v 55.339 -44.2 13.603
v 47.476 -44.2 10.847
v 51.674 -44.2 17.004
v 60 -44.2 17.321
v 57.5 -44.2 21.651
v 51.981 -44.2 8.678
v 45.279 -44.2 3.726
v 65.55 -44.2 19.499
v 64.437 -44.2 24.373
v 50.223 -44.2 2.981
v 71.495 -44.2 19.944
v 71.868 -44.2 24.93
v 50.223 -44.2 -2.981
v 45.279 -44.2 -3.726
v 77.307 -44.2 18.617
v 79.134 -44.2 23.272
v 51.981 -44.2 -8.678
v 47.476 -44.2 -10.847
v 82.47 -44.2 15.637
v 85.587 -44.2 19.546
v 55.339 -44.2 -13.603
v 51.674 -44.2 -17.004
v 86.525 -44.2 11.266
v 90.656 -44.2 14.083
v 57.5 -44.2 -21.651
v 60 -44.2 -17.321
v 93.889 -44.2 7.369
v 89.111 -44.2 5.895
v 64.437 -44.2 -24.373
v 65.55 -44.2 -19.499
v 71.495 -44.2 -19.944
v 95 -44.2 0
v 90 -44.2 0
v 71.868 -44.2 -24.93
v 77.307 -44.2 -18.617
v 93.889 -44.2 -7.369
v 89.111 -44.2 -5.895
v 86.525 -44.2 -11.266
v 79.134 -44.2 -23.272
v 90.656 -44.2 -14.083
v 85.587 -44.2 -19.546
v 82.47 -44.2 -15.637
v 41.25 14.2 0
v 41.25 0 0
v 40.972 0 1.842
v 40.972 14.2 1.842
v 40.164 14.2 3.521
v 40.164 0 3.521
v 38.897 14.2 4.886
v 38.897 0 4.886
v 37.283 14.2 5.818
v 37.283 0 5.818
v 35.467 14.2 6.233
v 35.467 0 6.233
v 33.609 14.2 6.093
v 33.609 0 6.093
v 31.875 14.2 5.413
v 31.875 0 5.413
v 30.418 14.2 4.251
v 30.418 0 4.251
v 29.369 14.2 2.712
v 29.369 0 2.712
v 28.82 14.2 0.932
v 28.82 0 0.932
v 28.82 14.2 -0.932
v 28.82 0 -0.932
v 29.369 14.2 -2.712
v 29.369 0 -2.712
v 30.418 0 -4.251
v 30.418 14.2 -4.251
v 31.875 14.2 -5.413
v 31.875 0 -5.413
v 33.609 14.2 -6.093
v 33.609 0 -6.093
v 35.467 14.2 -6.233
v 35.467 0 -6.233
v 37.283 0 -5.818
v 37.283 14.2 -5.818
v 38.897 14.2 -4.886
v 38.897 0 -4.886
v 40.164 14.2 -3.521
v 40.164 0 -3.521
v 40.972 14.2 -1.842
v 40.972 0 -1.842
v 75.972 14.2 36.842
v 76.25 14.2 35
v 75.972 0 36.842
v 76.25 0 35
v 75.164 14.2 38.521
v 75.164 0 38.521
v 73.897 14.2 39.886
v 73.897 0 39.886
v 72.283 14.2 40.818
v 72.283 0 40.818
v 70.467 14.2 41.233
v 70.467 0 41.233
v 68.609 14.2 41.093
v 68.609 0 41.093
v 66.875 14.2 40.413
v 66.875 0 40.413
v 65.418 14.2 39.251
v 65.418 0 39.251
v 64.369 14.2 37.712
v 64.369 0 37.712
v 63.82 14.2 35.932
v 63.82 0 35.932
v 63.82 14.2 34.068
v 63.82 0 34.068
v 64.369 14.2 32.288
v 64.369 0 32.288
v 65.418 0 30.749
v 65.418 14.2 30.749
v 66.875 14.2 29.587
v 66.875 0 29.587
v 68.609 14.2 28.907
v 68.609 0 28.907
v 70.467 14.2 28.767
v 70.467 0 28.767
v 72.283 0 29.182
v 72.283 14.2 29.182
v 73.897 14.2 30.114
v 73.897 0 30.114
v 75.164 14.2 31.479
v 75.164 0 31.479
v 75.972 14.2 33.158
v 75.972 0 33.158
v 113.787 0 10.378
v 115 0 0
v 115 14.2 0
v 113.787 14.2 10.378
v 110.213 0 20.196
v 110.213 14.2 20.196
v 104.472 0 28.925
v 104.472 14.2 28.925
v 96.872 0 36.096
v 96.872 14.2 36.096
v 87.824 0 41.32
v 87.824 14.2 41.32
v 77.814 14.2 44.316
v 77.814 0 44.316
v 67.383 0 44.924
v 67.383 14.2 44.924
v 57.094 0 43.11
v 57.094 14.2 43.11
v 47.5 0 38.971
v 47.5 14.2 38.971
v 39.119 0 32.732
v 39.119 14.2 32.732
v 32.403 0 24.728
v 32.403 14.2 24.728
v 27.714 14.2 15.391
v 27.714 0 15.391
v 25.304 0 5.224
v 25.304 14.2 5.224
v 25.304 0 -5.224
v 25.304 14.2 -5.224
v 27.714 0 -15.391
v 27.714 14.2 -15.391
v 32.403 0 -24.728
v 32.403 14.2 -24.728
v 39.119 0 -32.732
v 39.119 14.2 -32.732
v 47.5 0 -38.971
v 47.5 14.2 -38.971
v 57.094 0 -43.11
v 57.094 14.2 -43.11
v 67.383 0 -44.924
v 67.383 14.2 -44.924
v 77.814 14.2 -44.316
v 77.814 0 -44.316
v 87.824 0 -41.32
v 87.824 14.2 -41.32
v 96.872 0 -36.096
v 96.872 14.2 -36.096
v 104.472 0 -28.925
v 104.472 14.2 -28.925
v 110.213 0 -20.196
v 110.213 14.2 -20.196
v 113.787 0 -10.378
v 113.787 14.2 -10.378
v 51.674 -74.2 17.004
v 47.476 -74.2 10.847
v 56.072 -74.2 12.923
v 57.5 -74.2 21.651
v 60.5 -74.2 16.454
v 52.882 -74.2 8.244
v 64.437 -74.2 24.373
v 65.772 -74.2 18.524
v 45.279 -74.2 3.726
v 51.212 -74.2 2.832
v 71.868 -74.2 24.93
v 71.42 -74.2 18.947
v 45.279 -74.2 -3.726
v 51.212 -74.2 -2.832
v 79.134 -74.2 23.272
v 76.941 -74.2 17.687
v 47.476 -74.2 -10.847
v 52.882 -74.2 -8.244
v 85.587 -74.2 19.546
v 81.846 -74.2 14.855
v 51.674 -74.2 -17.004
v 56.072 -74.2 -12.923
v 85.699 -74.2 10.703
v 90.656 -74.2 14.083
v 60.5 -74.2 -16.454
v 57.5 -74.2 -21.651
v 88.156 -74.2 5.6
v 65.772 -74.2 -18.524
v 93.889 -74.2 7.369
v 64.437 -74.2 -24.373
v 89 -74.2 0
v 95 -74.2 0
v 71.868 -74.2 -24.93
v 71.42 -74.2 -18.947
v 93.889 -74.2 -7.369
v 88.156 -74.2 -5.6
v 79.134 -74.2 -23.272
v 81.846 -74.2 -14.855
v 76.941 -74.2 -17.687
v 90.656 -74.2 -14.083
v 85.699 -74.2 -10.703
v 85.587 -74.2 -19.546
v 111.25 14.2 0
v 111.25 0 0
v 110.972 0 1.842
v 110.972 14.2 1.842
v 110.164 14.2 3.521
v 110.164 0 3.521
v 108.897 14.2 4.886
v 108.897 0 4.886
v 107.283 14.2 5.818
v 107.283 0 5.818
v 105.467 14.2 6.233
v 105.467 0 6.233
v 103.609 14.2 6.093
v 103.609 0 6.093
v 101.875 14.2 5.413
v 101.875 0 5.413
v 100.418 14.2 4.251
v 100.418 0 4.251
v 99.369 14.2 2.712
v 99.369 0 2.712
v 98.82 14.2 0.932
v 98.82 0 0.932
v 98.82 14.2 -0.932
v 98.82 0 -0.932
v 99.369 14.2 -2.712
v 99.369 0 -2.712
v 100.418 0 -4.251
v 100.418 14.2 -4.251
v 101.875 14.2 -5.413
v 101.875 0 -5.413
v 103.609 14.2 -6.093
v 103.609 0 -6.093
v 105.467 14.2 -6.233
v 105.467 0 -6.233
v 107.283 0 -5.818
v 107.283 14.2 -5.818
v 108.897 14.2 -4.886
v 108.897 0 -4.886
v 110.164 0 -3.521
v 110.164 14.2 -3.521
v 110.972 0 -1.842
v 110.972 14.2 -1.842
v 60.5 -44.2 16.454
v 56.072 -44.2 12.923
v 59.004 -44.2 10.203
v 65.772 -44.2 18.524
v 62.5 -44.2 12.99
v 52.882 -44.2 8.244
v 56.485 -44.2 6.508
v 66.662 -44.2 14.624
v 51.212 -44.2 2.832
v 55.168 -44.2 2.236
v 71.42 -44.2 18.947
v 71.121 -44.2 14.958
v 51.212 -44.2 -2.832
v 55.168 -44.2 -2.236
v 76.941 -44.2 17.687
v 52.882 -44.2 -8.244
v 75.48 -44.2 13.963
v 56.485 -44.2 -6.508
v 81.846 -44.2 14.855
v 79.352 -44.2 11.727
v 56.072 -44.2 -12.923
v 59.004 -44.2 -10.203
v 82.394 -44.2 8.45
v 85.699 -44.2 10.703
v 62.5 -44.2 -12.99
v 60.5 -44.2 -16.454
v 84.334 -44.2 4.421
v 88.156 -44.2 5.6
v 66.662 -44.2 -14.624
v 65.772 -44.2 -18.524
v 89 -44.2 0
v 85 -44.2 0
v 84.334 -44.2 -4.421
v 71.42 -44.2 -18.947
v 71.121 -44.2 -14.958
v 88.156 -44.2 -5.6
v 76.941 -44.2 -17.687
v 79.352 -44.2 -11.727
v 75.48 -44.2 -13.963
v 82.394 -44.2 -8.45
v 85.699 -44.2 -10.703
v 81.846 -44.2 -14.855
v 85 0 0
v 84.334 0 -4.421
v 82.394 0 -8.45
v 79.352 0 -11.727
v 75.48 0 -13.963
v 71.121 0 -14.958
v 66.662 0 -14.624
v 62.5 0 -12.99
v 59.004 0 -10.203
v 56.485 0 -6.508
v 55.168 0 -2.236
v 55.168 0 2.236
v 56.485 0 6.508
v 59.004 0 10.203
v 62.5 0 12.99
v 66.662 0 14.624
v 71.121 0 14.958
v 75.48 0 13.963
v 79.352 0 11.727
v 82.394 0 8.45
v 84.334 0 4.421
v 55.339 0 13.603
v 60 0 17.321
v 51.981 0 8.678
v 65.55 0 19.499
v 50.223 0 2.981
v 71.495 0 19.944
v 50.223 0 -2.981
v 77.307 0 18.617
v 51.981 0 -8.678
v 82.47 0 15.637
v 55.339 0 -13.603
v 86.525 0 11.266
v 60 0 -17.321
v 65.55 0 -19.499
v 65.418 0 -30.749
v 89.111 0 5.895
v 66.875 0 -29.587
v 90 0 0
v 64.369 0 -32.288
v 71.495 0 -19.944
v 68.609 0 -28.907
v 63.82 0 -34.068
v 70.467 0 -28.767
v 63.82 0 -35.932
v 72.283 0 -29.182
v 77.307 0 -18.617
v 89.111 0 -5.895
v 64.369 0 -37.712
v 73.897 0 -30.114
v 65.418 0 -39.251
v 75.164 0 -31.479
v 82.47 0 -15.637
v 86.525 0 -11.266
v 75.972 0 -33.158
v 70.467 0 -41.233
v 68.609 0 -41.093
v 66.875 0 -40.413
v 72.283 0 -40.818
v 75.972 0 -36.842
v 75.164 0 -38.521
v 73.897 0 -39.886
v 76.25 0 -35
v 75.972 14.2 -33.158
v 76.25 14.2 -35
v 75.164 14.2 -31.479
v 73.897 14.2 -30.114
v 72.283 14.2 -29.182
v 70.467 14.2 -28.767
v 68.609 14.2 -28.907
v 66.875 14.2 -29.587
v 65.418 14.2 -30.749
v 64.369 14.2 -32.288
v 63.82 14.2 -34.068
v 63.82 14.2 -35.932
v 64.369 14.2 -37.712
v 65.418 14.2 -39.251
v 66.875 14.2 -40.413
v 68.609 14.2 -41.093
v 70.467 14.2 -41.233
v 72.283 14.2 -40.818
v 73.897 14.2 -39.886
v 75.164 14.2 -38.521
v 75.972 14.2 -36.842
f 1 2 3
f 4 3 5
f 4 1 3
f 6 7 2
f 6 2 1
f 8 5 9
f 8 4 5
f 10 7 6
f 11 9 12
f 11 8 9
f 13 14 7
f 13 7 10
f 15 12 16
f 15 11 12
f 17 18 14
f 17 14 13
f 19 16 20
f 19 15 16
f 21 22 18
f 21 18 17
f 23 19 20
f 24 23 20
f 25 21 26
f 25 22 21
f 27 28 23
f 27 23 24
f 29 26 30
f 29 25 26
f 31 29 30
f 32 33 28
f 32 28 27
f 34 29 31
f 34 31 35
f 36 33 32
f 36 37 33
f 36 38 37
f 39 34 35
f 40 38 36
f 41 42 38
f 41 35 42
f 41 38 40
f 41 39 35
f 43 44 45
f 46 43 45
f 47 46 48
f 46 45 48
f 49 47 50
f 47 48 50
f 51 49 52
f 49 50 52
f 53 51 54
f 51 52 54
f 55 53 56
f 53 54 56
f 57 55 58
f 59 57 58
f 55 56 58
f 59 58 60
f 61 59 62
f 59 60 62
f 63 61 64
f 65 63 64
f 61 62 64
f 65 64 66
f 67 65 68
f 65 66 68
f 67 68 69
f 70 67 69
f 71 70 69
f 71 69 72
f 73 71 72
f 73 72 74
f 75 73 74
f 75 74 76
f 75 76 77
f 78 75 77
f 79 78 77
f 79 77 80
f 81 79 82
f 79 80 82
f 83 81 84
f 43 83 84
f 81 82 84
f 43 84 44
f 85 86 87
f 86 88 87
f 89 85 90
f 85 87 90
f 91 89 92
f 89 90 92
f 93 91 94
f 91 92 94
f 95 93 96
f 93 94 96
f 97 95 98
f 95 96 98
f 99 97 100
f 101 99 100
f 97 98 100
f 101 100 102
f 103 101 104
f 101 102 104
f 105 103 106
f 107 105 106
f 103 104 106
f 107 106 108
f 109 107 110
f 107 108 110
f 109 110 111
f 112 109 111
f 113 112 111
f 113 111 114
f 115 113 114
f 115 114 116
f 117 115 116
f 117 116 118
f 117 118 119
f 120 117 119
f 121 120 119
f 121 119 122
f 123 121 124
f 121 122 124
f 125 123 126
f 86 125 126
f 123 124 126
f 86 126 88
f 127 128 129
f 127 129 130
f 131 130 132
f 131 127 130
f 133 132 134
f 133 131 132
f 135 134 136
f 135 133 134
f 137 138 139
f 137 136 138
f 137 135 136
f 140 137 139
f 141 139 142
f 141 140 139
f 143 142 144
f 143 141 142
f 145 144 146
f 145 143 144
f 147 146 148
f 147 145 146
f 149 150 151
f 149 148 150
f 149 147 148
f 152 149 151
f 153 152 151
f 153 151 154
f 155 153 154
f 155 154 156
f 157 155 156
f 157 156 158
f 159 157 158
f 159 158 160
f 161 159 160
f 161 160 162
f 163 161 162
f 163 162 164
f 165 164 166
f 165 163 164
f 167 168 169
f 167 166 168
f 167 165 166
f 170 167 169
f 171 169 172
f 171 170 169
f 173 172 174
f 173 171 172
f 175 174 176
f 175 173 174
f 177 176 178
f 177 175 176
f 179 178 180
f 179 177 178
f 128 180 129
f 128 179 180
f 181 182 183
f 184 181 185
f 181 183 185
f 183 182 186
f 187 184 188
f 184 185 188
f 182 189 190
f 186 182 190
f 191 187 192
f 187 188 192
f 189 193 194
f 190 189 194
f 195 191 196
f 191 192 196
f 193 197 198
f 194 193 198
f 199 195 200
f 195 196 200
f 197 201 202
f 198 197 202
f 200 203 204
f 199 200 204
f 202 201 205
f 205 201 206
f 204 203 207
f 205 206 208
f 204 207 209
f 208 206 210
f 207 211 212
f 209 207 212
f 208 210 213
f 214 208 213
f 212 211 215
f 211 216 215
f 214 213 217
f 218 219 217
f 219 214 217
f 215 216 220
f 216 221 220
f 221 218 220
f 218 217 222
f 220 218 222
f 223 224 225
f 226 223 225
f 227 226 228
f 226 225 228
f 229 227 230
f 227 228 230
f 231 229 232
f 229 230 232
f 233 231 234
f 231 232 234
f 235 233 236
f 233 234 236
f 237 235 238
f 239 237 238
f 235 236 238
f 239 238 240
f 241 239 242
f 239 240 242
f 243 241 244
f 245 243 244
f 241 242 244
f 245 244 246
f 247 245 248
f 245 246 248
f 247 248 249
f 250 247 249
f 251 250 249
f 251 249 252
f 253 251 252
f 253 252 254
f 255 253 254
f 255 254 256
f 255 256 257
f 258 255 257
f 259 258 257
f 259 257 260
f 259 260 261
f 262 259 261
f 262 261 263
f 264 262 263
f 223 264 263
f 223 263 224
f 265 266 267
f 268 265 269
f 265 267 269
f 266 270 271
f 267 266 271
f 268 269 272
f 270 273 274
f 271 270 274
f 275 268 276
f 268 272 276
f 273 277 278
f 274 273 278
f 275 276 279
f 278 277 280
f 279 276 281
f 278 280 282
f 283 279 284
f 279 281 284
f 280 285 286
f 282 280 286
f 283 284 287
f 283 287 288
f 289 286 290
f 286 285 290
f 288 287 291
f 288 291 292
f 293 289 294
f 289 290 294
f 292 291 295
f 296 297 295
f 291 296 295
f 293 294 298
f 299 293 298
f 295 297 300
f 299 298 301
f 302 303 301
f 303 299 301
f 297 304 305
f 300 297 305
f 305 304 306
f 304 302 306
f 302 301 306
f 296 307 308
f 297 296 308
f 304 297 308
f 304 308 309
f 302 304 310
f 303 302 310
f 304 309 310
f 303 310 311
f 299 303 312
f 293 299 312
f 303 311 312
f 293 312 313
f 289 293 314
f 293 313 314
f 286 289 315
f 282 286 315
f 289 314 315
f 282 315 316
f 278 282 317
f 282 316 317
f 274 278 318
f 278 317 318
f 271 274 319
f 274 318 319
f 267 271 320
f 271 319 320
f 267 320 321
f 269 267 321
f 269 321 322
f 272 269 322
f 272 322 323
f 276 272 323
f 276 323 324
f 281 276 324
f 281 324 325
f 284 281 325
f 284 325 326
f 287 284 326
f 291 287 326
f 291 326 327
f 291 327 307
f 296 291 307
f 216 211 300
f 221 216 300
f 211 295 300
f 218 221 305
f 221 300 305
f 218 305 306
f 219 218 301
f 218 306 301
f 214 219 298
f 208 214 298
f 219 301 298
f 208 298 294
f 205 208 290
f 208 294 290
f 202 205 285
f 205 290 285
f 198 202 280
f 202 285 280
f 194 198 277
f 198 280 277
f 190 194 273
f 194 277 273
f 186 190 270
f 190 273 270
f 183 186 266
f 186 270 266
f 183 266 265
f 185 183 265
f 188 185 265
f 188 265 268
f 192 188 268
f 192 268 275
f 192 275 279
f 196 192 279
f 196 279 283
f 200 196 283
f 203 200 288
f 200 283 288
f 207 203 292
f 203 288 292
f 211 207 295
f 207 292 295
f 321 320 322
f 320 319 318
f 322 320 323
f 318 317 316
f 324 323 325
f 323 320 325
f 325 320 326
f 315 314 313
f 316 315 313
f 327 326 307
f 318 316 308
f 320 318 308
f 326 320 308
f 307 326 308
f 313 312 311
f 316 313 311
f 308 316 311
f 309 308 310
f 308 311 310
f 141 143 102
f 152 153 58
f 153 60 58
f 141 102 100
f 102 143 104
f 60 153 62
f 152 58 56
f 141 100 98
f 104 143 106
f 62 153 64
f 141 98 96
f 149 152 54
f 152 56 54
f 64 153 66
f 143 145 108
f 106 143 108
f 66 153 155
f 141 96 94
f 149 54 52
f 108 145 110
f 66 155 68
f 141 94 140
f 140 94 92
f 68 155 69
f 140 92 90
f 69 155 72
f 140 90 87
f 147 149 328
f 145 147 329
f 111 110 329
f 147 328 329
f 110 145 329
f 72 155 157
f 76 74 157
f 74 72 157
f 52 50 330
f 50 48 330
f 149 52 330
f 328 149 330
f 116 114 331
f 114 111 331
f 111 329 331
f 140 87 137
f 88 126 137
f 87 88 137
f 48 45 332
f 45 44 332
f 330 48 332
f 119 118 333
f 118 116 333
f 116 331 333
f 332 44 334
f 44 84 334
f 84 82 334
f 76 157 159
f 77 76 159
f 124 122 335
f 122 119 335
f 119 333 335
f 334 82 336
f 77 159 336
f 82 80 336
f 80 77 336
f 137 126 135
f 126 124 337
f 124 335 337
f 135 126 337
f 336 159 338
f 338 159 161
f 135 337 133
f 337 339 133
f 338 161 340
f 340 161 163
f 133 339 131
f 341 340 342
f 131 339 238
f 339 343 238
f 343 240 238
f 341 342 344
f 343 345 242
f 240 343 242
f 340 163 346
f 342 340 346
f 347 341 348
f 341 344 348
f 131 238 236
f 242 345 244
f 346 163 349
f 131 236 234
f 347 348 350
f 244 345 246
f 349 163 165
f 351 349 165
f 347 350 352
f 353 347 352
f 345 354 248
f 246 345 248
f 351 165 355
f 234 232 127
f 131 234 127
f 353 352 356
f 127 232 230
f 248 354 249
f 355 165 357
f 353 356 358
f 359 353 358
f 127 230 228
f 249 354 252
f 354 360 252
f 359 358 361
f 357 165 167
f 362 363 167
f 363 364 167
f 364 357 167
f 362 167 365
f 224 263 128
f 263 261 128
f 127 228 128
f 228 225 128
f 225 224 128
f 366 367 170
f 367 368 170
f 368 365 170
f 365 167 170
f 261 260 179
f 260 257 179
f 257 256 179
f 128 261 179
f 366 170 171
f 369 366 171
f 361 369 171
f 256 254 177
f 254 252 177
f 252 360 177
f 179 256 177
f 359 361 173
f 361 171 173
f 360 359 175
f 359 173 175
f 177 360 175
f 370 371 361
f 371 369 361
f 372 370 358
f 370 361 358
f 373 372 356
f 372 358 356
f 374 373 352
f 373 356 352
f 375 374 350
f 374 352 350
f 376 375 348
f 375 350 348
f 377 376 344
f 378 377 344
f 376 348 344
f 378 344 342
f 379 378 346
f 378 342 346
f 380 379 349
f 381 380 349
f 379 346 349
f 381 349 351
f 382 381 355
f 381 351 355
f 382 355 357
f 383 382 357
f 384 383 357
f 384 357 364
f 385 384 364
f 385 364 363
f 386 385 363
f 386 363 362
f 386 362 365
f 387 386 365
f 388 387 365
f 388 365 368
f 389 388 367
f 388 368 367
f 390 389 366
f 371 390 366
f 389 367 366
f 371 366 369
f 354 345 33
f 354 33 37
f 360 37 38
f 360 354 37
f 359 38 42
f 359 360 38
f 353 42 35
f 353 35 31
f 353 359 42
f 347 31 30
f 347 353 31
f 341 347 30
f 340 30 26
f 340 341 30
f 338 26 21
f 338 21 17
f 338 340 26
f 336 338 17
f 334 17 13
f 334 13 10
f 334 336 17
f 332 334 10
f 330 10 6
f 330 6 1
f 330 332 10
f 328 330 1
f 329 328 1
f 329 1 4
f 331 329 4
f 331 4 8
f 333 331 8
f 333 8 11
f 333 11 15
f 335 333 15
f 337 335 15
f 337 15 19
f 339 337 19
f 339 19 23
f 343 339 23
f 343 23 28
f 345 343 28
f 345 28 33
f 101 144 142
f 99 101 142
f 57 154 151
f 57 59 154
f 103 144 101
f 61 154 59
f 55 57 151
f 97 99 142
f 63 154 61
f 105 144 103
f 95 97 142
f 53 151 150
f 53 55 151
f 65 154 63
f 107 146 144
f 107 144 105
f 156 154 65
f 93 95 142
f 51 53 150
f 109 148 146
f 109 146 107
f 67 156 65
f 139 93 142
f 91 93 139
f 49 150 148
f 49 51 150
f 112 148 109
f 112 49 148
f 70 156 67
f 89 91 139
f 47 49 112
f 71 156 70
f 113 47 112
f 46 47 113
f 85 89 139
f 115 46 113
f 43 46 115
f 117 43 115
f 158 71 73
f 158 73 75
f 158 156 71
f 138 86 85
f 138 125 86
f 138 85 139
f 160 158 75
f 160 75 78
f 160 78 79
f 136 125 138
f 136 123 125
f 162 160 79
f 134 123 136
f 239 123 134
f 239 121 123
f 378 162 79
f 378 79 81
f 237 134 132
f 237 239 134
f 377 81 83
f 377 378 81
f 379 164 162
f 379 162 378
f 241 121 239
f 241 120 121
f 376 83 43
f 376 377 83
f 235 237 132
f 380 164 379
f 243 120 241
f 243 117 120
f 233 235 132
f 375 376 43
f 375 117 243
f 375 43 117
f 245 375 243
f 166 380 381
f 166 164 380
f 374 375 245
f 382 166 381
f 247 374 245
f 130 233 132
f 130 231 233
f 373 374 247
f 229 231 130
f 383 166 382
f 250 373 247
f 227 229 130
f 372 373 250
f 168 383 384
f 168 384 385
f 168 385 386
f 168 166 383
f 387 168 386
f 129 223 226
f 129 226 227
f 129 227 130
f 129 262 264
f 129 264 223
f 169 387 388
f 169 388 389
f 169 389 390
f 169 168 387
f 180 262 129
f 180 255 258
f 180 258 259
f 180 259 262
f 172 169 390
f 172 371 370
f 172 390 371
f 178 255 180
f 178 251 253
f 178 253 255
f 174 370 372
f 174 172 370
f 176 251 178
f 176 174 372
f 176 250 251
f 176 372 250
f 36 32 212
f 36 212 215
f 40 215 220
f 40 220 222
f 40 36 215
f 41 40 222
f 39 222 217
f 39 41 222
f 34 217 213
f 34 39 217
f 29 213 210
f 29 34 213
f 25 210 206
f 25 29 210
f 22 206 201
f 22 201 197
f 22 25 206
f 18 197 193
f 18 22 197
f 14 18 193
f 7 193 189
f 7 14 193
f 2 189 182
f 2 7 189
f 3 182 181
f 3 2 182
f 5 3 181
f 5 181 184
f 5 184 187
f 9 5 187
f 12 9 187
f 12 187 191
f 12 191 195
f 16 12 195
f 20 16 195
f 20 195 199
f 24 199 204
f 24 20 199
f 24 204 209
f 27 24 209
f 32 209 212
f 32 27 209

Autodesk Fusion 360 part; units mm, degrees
sketch "Boceto1" plane through (0, 0, 0) normal (0, 1, 0) x (1, 0, 0)
  circle A0 centre (70, 0) radius 45
extrude "Extruir2" add sketch "Boceto1" along normal blind 14.2 makes body 1
sketch "Boceto2" plane through (0, 0, 0) normal (0, 1, 0) x (1, 0, 0)
  circle A0 centre (70, -35) radius 6.25
  circle A1 centre (35, 0) radius 6.25
  circle A2 centre (70, 35) radius 6.25
  circle A3 centre (105, 0) radius 6.25
extrude "Extruir3" cut sketch "Boceto2" along normal blind 15 bodies 1
sketch "Boceto3" plane through (0, 0, 0) normal (0, 1, 0) x (1, 0, 0)
  circle A0 centre (70, 0) radius 19
  circle A1 centre (70, 0) radius 24
  line L0 (70, -45) -> (70, -24)
  line L1 (70, -19) -> (70, 19)
  line L2 (70, 24) -> (70, 45)
  line L3 (25, 0) -> (46, 0)
  line L4 (51, 0) -> (89, 0)
  line L5 (94, 0) -> (115, 0)
extrude "Extruir5" add sketch "Boceto3" against normal blind 44.2 bodies 1
sketch "Boceto7" plane through (0, 0, 0) normal (0, 1, 0) x (1, 0, 0)
  circle A0 centre (-25, 0) radius 25
  circle A1 centre (-25, 0) radius 19
extrude "Extruir6" add sketch "Boceto7" against normal blind 30 separate body makes body 2
delete_face "SuprimirCaras2" 1 faces at (93.8807, -29.4667, 2.3896) on bodies 1
sketch "Boceto8" plane through (0, 0, 0) normal (0, 1, 0) x (1, 0, 0)
  circle A0 centre (70, 0) radius 15
  circle A1 centre (70, 0) radius 20
extrude "Extruir7" add sketch "Boceto8" against normal blind 44.2 bodies 1
move_body "Alinear1" bodies 2 to x (1, 0, 0) y (0, 1, 0) z (0, 0, 1) at (95, -14.2, 0)
move_body "Desplazar1" bodies 2 to x (1, 0, 0) y (0, 1, 0) z (0, 0, 1) at (0, -30, 0)
combine "Combinar1" operation add target body 1 tool bodies 2
